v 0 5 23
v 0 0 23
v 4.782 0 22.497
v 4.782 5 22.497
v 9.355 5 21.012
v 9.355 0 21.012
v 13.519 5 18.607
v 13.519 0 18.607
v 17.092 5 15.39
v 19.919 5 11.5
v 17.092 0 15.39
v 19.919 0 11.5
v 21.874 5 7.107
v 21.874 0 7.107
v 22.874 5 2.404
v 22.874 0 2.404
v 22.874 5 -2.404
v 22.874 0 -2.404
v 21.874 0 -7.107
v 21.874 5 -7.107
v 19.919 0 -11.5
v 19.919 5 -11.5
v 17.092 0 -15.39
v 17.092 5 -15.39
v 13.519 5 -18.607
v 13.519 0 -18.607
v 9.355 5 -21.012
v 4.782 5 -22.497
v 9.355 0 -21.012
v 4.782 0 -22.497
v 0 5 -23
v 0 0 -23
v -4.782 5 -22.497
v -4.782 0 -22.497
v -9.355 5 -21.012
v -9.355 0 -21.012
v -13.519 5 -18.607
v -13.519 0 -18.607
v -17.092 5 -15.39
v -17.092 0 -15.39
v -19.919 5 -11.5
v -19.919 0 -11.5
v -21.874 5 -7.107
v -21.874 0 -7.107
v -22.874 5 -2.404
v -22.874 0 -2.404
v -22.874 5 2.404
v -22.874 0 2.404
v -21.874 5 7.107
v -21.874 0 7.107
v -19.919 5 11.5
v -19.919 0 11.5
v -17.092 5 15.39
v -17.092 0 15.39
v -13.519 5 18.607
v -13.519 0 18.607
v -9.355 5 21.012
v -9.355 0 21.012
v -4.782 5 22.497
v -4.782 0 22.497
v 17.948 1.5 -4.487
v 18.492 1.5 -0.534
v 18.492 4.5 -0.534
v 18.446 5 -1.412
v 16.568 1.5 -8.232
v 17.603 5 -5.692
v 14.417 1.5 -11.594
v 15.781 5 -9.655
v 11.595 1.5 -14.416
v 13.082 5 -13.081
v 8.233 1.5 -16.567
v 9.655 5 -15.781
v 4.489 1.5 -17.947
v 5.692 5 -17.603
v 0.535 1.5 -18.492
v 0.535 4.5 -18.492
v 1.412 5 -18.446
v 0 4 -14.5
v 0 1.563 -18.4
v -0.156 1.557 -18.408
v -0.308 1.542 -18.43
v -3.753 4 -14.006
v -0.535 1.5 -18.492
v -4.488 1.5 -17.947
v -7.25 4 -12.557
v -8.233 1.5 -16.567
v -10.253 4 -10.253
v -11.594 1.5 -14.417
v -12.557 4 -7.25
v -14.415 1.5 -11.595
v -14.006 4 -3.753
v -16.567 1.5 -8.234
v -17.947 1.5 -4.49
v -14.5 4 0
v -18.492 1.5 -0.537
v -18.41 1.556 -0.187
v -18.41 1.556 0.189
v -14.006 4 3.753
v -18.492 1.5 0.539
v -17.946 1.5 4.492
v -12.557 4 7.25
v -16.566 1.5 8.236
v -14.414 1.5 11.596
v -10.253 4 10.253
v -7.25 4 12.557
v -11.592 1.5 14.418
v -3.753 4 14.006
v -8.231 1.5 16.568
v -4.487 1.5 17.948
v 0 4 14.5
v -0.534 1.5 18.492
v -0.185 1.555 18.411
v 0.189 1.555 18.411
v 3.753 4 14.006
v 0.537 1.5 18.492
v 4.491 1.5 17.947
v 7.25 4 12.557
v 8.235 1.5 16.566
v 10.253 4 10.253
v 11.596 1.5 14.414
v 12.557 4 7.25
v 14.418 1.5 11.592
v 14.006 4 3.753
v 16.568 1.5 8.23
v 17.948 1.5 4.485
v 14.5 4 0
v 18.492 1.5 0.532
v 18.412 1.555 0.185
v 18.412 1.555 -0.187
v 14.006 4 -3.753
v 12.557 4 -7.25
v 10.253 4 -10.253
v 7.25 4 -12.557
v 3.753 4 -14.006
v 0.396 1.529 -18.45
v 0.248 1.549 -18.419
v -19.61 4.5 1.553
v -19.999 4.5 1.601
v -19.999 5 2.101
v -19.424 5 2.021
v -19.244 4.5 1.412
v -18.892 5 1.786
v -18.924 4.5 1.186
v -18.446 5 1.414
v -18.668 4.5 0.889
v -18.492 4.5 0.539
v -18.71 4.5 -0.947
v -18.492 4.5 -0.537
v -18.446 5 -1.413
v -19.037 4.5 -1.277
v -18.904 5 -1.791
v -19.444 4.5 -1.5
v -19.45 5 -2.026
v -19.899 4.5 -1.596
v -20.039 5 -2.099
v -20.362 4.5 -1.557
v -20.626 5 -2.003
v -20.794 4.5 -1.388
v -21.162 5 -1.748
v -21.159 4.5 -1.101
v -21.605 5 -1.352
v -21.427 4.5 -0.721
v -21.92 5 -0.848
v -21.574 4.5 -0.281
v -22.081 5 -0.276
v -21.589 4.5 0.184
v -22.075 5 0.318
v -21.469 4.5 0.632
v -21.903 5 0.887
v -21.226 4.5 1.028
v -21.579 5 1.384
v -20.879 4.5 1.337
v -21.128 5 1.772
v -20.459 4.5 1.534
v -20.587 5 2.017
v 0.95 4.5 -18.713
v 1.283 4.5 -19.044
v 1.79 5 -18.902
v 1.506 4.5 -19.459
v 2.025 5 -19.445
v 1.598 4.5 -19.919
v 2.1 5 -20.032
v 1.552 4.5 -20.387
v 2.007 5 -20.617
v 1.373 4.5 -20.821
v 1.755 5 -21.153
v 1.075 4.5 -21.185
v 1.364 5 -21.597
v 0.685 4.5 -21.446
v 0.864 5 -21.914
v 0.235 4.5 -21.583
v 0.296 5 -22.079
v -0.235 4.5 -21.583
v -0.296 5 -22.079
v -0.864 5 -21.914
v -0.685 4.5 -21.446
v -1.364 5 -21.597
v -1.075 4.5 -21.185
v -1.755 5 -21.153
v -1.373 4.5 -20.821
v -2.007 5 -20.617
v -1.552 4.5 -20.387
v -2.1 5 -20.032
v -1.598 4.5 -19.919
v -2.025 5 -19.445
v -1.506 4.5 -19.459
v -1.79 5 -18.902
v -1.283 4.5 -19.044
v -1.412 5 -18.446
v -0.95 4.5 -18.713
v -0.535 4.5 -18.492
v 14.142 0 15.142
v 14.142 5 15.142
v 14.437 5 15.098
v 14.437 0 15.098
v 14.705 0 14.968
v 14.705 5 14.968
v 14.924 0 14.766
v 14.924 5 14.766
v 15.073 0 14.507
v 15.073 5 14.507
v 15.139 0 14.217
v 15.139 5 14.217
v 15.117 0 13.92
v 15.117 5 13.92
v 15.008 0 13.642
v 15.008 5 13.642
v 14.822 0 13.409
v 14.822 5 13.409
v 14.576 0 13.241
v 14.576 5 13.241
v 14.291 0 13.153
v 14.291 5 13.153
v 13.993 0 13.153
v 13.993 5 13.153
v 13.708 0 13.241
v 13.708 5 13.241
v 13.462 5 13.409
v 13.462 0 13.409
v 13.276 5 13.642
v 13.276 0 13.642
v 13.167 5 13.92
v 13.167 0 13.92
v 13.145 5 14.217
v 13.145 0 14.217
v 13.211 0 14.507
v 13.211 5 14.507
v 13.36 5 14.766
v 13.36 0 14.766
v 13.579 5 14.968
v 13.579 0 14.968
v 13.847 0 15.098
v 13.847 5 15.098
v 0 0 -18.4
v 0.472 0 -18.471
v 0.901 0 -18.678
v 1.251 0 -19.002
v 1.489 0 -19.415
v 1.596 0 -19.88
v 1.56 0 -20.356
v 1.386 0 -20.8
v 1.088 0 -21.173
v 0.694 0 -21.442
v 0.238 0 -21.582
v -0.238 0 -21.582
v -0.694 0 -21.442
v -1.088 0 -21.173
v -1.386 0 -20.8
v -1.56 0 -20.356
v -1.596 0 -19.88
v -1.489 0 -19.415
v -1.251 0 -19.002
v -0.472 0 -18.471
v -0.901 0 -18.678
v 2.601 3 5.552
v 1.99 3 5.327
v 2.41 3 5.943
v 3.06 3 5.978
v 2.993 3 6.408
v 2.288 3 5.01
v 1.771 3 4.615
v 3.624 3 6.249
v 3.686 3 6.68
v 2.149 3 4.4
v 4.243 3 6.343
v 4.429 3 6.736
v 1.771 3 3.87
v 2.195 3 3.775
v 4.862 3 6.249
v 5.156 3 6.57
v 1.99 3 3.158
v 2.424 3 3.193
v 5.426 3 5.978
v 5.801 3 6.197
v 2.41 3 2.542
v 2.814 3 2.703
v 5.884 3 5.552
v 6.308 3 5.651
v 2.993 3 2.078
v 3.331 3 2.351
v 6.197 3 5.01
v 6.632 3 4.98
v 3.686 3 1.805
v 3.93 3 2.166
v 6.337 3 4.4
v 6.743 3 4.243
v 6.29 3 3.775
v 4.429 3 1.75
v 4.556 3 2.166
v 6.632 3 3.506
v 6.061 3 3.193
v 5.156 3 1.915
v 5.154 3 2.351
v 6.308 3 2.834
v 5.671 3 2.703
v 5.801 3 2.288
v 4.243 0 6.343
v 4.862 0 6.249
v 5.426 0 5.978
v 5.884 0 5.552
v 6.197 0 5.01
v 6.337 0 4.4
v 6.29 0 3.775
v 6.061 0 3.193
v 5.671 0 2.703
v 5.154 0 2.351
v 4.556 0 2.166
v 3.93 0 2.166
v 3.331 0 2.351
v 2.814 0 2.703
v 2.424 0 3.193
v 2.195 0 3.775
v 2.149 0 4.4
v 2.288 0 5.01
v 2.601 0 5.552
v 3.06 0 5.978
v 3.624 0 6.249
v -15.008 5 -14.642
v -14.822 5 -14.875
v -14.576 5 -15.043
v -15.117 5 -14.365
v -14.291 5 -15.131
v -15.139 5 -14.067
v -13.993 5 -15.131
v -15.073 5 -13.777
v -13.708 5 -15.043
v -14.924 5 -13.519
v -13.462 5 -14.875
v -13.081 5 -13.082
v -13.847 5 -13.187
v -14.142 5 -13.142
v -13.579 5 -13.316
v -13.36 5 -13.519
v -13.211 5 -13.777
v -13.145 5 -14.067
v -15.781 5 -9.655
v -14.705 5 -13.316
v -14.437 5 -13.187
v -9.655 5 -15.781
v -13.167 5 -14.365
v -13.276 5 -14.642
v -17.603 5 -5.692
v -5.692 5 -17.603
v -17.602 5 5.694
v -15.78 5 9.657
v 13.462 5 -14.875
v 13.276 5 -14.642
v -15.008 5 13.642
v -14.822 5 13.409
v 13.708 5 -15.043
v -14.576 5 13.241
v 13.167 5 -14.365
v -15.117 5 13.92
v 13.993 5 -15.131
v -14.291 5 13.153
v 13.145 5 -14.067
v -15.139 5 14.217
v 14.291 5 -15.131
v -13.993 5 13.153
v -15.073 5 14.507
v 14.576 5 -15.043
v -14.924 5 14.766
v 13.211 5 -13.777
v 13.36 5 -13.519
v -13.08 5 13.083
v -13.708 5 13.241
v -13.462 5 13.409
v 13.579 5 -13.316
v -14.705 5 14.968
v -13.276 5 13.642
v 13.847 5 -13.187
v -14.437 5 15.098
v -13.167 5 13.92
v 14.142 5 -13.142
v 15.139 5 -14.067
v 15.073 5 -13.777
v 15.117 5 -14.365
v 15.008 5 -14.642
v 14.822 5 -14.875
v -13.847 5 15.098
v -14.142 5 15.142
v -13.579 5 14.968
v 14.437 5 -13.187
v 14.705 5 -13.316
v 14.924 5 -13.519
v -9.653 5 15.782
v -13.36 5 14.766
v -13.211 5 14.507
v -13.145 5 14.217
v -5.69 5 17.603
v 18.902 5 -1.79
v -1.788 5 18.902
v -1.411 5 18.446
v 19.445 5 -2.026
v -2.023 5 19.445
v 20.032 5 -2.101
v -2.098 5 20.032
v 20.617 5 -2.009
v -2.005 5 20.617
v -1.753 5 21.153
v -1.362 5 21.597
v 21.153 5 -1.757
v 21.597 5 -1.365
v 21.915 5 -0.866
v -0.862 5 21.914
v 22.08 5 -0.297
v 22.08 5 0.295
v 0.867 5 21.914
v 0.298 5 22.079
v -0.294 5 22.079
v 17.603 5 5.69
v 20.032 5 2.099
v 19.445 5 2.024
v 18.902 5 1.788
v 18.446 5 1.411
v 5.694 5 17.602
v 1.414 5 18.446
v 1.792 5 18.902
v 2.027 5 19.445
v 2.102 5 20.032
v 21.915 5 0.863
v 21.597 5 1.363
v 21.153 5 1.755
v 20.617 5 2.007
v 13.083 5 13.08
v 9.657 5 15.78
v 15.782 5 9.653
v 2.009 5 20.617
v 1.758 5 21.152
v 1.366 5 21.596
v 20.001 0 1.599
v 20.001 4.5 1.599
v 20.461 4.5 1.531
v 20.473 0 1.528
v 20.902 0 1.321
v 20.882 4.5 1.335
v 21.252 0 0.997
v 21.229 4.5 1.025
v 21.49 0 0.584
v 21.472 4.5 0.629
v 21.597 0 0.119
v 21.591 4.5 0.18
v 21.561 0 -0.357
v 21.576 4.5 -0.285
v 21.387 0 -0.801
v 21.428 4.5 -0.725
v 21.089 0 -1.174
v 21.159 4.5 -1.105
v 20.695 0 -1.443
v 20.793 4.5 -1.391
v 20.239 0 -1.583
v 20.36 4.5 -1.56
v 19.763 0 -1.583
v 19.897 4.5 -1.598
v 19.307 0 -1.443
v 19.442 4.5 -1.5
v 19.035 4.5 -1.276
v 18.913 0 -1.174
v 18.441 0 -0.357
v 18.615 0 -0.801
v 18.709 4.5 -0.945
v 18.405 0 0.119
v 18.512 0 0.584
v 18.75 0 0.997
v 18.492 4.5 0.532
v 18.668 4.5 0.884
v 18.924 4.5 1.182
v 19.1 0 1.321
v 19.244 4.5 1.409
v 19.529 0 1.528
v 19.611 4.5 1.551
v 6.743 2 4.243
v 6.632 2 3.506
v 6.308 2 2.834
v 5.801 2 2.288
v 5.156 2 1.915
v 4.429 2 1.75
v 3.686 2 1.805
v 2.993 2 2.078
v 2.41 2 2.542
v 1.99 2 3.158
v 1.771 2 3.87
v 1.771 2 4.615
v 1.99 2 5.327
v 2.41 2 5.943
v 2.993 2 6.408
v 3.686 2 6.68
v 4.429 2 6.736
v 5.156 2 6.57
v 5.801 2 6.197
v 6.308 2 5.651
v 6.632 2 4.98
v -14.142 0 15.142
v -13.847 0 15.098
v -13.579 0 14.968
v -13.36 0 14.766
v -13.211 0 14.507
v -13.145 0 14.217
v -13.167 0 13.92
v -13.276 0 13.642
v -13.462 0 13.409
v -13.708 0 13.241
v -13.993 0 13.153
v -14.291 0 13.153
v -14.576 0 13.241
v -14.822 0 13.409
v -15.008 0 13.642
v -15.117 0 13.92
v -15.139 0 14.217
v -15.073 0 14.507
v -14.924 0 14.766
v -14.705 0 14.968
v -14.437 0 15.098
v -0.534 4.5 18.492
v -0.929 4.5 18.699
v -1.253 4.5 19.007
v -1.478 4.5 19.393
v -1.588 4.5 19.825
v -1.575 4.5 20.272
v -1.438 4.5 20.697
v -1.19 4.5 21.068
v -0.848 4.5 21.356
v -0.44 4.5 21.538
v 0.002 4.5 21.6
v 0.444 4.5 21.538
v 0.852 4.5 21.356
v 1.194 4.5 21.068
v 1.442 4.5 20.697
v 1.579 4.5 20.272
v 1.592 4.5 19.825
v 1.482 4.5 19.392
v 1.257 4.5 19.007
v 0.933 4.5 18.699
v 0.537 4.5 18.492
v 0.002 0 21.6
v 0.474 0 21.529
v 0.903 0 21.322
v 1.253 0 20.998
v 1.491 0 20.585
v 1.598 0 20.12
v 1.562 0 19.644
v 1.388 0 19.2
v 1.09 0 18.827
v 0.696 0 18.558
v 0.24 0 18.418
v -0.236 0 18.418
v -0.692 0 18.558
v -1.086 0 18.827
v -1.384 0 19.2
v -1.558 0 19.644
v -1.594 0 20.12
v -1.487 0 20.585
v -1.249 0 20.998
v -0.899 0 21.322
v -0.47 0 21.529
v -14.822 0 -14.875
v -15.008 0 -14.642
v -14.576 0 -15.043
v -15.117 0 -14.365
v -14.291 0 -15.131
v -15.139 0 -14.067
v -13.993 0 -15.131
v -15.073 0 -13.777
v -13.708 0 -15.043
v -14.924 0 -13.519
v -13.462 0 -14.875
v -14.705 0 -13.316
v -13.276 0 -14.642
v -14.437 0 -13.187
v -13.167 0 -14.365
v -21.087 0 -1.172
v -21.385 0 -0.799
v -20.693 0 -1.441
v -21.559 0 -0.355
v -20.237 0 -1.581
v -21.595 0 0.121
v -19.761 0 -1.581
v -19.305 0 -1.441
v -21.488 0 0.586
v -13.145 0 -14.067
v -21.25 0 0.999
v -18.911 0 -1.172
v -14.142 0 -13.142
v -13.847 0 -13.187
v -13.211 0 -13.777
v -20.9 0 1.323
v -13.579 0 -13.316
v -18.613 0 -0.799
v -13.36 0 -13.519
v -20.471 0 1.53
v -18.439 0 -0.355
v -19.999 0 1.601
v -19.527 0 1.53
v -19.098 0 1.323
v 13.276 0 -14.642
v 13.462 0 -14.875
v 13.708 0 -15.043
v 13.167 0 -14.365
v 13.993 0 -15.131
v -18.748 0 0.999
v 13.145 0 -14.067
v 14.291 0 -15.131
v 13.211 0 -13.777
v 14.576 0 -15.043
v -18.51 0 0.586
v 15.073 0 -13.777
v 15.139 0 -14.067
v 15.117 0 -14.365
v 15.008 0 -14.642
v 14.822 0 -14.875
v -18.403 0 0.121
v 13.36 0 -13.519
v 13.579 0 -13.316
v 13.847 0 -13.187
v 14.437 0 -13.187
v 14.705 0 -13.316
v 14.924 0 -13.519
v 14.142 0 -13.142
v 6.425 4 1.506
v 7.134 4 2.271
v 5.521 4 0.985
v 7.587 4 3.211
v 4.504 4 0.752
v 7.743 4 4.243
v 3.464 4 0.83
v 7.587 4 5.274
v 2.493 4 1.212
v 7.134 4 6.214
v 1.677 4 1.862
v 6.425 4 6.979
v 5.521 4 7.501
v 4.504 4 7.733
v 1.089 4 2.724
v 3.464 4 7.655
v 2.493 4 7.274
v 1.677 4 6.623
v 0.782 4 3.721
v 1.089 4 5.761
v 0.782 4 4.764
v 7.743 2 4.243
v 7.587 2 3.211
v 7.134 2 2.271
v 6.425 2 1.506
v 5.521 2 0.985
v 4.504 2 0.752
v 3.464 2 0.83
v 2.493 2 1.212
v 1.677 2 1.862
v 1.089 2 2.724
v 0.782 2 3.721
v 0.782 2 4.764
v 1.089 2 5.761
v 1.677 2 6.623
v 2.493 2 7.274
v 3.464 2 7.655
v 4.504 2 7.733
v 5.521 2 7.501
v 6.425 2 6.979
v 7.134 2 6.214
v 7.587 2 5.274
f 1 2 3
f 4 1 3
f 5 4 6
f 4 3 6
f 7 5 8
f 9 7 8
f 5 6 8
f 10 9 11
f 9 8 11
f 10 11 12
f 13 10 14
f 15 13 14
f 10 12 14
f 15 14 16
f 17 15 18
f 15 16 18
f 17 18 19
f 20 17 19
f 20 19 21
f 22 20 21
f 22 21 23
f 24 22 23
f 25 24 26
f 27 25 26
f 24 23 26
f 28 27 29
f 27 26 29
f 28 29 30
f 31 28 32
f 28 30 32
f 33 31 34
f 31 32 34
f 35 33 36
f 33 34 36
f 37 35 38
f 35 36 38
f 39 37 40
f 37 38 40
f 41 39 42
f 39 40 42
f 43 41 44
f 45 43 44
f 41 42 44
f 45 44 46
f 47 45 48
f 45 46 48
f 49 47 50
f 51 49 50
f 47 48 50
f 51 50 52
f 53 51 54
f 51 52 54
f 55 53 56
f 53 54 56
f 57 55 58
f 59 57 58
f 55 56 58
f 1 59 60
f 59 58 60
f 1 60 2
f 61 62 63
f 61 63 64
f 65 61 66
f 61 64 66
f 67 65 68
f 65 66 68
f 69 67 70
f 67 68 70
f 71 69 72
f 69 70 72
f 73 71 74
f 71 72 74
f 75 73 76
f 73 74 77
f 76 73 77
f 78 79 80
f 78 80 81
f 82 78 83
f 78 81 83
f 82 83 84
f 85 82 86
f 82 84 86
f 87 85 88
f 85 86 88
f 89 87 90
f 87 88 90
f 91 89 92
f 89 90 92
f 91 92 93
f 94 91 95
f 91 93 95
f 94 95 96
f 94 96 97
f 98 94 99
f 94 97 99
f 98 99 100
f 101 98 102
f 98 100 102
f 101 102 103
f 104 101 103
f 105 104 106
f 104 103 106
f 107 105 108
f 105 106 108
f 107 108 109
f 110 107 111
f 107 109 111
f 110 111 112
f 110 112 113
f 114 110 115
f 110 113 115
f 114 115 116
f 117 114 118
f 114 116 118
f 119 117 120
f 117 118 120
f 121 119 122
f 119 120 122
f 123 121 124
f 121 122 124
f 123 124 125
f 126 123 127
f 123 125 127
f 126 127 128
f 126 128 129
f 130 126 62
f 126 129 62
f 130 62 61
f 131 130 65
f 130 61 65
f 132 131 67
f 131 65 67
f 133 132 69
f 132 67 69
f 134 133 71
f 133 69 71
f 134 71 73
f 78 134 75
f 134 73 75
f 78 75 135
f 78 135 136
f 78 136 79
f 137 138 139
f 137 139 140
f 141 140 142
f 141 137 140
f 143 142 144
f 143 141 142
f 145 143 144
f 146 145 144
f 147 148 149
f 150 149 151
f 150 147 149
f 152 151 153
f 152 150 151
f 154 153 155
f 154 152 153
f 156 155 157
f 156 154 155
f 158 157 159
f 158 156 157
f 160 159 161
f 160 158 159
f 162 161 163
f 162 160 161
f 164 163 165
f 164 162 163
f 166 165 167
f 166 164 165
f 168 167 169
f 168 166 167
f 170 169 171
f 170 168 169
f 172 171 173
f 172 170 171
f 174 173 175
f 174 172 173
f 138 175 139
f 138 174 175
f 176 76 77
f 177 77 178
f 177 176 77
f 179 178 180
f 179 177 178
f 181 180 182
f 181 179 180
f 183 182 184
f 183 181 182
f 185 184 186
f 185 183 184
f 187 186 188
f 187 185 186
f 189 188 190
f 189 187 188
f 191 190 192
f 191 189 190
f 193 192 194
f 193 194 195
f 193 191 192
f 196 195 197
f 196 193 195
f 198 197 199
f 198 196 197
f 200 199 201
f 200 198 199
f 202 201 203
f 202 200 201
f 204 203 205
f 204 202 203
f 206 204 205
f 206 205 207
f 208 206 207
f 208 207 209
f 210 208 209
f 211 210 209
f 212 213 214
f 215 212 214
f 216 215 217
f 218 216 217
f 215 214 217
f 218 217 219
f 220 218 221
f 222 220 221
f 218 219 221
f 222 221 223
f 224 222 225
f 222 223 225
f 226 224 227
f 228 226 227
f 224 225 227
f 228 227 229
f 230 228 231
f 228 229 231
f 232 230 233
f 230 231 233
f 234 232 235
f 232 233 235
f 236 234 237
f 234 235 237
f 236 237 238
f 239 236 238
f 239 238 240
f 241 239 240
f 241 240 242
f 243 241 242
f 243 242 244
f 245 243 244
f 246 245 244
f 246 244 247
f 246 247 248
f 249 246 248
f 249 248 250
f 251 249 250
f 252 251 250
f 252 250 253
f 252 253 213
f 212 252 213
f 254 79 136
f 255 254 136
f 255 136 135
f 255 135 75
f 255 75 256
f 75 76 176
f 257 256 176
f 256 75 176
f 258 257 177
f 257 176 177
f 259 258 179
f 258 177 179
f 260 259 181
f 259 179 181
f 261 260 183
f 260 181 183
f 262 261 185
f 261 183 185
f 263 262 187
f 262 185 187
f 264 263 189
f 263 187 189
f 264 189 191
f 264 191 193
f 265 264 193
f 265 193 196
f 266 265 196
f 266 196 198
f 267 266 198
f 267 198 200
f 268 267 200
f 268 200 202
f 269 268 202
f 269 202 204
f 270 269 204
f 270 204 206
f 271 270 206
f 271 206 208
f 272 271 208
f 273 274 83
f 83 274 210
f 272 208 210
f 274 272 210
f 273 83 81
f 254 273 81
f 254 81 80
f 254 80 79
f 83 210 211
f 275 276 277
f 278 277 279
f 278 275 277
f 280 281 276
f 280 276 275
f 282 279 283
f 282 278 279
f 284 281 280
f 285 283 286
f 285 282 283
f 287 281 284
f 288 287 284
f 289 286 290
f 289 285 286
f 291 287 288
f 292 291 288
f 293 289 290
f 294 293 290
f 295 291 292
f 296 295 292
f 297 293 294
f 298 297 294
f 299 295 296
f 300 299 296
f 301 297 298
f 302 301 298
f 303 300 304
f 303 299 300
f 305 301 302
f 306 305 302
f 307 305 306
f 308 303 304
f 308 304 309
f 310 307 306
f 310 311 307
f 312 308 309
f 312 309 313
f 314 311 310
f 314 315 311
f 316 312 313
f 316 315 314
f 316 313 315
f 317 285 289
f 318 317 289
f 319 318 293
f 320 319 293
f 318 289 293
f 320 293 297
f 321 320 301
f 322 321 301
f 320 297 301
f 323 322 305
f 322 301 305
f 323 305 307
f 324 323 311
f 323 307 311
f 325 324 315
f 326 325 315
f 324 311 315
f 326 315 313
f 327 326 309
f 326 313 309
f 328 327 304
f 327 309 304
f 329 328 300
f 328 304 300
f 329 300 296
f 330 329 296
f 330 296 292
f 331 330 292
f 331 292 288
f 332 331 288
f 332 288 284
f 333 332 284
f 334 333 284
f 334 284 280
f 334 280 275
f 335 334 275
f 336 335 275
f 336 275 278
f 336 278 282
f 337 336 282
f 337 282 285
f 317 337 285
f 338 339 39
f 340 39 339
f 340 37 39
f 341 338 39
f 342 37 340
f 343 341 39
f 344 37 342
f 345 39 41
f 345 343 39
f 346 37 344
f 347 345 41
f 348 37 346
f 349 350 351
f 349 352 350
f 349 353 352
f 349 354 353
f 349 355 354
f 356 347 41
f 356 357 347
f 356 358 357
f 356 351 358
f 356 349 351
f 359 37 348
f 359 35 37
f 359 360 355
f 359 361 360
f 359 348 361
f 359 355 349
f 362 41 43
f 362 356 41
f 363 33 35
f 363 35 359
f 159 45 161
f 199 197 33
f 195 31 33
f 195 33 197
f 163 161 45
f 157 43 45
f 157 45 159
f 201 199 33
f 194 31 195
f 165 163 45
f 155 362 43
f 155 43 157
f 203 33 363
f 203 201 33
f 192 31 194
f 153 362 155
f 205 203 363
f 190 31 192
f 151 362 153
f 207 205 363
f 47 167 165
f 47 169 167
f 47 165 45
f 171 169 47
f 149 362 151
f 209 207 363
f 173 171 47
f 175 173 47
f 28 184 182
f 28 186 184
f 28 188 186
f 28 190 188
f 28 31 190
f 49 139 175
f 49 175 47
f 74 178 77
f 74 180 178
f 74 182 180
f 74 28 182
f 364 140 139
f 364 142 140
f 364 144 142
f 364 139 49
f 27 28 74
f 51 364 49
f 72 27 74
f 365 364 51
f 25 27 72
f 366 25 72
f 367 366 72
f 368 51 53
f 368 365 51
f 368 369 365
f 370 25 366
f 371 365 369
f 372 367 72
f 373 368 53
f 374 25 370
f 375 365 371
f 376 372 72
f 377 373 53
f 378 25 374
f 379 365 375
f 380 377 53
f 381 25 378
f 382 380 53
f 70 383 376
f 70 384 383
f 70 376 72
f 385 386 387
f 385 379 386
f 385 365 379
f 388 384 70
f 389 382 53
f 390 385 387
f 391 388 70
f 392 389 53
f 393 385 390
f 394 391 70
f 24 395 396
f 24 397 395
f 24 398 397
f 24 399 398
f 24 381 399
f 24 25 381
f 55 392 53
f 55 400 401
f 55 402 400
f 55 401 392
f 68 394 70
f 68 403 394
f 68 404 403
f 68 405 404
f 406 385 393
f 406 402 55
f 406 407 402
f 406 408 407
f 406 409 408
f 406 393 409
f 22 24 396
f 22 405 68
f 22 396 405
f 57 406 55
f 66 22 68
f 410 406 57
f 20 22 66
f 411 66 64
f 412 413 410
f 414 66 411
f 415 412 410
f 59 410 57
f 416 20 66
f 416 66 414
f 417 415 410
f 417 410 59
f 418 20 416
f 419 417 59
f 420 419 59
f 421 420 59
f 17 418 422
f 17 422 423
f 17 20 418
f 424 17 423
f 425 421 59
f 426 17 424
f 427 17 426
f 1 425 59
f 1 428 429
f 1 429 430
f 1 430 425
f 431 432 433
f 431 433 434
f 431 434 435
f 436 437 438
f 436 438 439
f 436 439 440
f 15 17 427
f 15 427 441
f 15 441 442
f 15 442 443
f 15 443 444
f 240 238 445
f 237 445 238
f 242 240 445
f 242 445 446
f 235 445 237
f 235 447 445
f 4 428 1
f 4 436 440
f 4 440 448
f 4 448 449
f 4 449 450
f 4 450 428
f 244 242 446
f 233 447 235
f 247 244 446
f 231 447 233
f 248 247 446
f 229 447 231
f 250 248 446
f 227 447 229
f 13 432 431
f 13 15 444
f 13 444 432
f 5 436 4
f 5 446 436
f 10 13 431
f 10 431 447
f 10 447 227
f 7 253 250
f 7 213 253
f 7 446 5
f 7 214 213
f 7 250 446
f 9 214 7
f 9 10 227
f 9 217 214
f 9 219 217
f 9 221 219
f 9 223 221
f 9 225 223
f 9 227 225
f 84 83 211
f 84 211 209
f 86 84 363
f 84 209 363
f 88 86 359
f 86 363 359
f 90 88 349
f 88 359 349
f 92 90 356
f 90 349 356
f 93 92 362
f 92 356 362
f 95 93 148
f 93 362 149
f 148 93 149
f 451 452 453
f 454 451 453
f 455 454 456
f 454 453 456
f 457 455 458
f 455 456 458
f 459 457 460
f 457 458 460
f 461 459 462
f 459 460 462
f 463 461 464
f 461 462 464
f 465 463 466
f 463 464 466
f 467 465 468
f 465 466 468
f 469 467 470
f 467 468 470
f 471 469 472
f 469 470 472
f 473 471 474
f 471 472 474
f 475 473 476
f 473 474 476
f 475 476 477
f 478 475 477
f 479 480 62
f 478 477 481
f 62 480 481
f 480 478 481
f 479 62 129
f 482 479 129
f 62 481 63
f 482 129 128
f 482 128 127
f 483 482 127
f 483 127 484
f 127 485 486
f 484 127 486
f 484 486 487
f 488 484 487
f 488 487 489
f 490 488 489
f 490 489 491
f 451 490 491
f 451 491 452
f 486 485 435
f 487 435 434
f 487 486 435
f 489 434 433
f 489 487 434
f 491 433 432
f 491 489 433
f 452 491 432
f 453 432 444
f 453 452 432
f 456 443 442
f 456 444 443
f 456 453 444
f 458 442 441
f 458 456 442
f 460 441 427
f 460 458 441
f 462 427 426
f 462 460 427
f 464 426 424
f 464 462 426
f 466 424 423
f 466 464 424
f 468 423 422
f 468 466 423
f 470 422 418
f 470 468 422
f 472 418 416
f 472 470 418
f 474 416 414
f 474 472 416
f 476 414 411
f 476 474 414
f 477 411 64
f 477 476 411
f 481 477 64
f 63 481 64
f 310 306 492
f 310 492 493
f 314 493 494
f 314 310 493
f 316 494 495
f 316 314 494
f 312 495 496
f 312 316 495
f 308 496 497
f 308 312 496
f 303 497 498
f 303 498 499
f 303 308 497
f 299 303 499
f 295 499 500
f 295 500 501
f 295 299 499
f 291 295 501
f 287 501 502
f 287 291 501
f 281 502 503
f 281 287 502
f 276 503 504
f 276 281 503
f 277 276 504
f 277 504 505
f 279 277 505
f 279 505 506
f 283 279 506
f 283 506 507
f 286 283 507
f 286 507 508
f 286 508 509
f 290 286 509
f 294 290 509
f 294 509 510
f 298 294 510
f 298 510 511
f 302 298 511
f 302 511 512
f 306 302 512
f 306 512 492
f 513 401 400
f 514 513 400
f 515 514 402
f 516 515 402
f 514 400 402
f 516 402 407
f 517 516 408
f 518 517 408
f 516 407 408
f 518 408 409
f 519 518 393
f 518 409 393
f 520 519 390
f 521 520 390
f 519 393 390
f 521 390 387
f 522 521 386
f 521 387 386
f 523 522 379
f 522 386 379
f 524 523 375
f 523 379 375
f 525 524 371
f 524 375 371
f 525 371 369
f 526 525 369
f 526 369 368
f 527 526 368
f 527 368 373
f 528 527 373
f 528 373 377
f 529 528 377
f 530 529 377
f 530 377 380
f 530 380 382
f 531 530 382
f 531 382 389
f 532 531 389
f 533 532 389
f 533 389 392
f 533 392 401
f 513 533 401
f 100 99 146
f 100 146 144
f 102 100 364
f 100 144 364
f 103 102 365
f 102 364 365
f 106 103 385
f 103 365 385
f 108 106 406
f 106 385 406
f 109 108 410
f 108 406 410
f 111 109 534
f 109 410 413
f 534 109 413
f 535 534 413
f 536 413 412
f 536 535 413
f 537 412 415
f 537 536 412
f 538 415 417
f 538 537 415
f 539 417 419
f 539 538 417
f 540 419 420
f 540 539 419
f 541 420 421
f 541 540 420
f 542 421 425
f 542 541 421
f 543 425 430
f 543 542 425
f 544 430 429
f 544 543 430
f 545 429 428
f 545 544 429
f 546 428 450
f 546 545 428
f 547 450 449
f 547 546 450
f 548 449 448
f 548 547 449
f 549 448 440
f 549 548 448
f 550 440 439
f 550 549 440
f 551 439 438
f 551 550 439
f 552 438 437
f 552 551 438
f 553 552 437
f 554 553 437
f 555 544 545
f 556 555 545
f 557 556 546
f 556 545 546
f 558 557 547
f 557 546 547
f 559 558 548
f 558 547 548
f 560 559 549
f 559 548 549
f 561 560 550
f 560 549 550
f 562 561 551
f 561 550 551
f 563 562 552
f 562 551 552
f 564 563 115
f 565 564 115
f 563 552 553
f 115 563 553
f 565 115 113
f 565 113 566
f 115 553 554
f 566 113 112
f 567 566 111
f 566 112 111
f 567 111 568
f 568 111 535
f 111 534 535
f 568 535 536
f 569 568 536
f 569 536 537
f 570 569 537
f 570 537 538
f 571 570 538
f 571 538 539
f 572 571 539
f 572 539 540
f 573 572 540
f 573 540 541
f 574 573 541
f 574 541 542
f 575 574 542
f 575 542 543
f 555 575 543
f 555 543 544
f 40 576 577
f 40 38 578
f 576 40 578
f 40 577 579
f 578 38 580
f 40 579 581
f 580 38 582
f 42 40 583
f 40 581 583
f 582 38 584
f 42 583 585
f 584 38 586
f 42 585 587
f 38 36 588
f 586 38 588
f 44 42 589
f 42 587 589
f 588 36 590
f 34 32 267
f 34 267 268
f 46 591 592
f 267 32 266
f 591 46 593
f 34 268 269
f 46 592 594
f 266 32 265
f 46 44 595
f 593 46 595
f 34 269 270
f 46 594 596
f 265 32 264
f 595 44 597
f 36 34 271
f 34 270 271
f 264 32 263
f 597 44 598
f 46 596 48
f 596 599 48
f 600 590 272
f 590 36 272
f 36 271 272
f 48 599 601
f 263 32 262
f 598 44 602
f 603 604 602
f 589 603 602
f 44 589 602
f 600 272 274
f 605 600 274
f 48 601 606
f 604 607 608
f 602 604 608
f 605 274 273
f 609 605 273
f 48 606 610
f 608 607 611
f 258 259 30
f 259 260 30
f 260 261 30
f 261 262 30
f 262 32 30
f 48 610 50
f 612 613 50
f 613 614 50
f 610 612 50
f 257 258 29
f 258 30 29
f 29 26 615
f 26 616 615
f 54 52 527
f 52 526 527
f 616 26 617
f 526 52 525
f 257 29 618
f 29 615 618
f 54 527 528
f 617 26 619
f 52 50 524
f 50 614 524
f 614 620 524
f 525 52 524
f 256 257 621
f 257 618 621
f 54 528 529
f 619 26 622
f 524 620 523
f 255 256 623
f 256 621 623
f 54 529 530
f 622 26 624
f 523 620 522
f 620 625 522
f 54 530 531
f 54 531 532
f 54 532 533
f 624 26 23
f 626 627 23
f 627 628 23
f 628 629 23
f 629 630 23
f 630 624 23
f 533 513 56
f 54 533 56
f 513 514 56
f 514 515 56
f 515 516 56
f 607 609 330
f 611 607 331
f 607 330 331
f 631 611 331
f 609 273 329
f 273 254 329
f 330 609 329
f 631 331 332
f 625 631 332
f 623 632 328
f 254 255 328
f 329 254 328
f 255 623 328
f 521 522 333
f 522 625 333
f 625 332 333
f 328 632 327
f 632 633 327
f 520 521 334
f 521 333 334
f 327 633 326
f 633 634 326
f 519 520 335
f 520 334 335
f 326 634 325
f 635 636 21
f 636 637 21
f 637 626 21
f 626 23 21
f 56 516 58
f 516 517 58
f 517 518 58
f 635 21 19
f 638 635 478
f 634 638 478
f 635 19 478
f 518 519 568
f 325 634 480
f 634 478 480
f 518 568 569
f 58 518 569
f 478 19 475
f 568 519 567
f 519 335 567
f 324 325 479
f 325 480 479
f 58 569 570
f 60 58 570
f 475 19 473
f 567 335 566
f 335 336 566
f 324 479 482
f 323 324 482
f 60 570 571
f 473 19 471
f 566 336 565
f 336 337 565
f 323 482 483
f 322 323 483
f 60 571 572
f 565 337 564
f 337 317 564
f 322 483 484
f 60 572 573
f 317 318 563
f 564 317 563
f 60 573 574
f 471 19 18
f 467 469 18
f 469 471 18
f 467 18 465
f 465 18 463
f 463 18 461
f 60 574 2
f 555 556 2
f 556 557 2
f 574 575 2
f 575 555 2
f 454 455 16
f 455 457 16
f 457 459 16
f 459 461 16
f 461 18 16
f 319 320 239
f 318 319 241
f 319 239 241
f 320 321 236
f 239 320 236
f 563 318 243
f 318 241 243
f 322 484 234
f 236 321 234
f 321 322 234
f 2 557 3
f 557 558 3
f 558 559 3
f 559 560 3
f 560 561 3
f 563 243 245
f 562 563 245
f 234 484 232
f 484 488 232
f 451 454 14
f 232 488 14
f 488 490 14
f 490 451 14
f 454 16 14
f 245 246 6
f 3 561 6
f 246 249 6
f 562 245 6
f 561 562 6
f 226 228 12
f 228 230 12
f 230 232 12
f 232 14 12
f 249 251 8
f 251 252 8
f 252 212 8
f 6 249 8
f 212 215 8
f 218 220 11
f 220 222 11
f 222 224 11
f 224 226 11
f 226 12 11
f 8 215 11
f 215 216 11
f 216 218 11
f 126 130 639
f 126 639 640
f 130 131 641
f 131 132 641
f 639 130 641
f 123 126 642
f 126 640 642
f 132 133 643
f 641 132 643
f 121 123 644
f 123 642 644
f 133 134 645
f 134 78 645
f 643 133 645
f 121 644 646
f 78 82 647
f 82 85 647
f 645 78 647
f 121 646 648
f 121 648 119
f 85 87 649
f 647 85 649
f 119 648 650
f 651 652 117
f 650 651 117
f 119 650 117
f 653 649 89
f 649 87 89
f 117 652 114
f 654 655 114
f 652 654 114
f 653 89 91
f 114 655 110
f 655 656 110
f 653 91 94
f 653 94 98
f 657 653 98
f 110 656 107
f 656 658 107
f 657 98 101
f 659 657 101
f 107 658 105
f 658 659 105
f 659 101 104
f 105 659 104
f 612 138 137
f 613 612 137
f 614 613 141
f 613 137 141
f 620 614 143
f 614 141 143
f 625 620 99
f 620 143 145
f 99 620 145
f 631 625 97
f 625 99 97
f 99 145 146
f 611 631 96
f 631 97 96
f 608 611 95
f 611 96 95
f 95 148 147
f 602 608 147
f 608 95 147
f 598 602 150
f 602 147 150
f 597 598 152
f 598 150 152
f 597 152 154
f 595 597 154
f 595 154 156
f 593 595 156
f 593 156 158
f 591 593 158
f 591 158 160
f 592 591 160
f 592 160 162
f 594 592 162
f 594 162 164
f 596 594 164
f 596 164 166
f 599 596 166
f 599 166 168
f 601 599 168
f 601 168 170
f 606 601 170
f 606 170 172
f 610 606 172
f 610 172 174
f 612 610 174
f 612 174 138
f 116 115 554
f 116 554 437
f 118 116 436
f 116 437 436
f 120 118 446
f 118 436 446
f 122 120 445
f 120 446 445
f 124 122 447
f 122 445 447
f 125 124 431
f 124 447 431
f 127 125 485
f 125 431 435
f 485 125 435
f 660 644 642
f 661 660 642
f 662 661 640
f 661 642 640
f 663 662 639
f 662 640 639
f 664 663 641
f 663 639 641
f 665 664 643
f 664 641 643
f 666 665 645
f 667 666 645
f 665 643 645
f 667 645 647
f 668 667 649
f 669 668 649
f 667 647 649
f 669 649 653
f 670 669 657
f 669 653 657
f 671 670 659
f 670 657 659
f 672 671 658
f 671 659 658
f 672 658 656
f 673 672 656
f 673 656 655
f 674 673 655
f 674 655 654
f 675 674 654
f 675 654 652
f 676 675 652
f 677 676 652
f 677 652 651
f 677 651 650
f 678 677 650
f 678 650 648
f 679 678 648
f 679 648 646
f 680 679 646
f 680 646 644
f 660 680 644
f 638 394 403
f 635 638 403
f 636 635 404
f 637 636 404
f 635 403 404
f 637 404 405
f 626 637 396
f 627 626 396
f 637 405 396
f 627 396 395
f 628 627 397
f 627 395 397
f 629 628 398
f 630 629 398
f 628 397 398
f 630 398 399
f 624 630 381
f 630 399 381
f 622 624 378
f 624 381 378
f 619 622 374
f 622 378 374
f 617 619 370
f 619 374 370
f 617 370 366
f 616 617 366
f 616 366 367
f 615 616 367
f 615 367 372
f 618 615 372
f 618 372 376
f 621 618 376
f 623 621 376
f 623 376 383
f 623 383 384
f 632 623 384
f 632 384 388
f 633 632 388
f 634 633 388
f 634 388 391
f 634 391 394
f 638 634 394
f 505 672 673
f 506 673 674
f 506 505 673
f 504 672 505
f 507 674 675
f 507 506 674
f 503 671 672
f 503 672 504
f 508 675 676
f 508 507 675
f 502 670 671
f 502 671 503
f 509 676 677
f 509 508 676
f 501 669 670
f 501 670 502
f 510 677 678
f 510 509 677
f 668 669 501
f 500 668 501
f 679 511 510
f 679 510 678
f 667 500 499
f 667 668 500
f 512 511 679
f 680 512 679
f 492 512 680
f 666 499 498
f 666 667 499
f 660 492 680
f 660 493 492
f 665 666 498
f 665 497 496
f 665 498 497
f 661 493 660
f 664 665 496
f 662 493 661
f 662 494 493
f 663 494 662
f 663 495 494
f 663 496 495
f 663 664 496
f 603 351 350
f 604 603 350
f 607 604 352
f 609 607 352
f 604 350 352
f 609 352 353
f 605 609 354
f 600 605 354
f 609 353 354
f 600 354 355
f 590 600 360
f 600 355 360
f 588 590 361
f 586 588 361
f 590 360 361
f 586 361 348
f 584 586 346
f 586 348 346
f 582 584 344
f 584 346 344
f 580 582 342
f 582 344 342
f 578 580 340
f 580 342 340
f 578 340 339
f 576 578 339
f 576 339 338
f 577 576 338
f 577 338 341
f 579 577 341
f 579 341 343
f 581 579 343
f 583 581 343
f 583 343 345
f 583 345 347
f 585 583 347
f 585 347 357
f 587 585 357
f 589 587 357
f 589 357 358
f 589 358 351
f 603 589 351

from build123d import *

# Parameters (mm, degrees)
SKETCH_1_R            = 23
EXTRUDE_1_DEPTH       = 5
SKETCH_2_R            = 1.6
CUT_EXTRUDE_1_DEPTH   = 33.908965344
SKETCH_3_R            = 1
CUT_EXTRUDE_2_DEPTH   = 33.908965344
SKETCH_4_W            = 14.5
SKETCH_4_H            = 1
SKETCH_5_R            = 2.1
CUT_EXTRUDE_3_DEPTH   = 33.771939229
SKETCH_6_R            = 3.5
SKETCH_6_R_2          = 2.5
CUT_EXTRUDE_1_2_DEPTH = 2
SKETCH_7_R            = 3.5
CUT_EXTRUDE_4_DEPTH   = 1
CHAMFER_1_SIZE        = 0.5


with BuildPart() as part:
    # 草图1 → 凸台-拉伸1 (new body)
    with BuildSketch(Plane(origin=(0, 0, 0), x_dir=(1, 0, 0), z_dir=(0, 1, 0))):
        with Locations(Location((0, 0, 0), (0, 0, 270))):
            Circle(SKETCH_1_R)
    extrude(amount=EXTRUDE_1_DEPTH)

    # 草图2 → Cut-Extrude 1 (cut, through all)
    with BuildSketch(Plane(origin=(0, 5, 0), x_dir=(1, 0, 0), z_dir=(0, 1, 0))):
        with Locations(Location((0, 20, 0), (0, 0, 270))):
            Circle(SKETCH_2_R)
        with Locations(Location((20.001, 0.001, 0), (0, 0, 270))):
            Circle(SKETCH_2_R)
        with Locations(Location((0.002, -20, 0), (0, 0, 270))):
            Circle(SKETCH_2_R)
        with Locations(Location((-19.999, -0.001, 0), (0, 0, 270))):
            Circle(SKETCH_2_R)
    extrude(amount=-CUT_EXTRUDE_1_DEPTH, mode=Mode.SUBTRACT)

    # 草图3 → 切除-拉伸2 (cut, through all)
    with BuildSketch(Plane(origin=(0, 5, 0), x_dir=(1, 0, 0), z_dir=(0, 1, 0))):
        with Locations(Location((14.142135624, 14.142135624, 0), (0, 0, 270))):
            Circle(SKETCH_3_R)
        with Locations(Location((14.142135624, -14.142135624, 0), (0, 0, 270))):
            Circle(SKETCH_3_R)
        with Locations(Location((-14.142135624, -14.142135624, 0), (0, 0, 270))):
            Circle(SKETCH_3_R)
        with Locations(Location((-14.142135624, 14.142135624, 0), (0, 0, 270))):
            Circle(SKETCH_3_R)
    extrude(amount=-CUT_EXTRUDE_2_DEPTH, mode=Mode.SUBTRACT)

    # 草图4 → 切除-旋转1 (revolve, cut)
    with BuildSketch(Plane.XY, mode=Mode.PRIVATE) as cut_revolve_1_sk:
        with Locations((7.25, 4.5)):
            Rectangle(SKETCH_4_W, SKETCH_4_H)
        Polygon((18.5, 1.5), (18.5, 5), (14.5, 5), (14.5, 4), align=None)
    revolve(cut_revolve_1_sk.sketch.rotate(Axis((0, 0, 0), (0, 1, 0)), 90), axis=Axis((0, 0, 0), (0, 1, 0)), mode=Mode.SUBTRACT)

    # 草图5 → 切除-拉伸3 (cut, through all)
    with BuildSketch(Plane(origin=(0, 4, 0), x_dir=(1, 0, 0), z_dir=(0, 1, 0))):
        with Locations(Location((4.242640687, -4.242640687, 0), (0, 0, 270))):
            Circle(SKETCH_5_R)
    extrude(amount=-CUT_EXTRUDE_3_DEPTH, mode=Mode.SUBTRACT)

    # 草图6 → Cut-Extrude 1 2 (cut)
    with BuildSketch(Plane(origin=(0, 4, 0), x_dir=(1, 0, 0), z_dir=(0, 1, 0))):
        with Locations((4.242640687, -4.242640687)):
            Circle(SKETCH_6_R)
        with Locations((4.242640687, -4.242640687)):
            Circle(SKETCH_6_R_2, mode=Mode.SUBTRACT)
    extrude(amount=-CUT_EXTRUDE_1_2_DEPTH, mode=Mode.SUBTRACT)

    # 草图7 → 切除-拉伸4 (cut)
    with BuildSketch(Plane(origin=(0, 4, 0), x_dir=(1, 0, 0), z_dir=(0, 1, 0))):
        with Locations((4.242640687, -4.242640687)):
            Circle(SKETCH_7_R)
    extrude(amount=-CUT_EXTRUDE_4_DEPTH, mode=Mode.SUBTRACT)

    # 倒角1
    chamfer_1_edges = [part.edges().sort_by_distance(p)[0] for p in [
        (0, 5, -21.6),
        (21.307215325, 5, -0.925013812),
        (1.578782453, 5, 20.271582579),
        (-21.306855112, 5, -0.920691384),
    ]]
    chamfer(chamfer_1_edges, length=CHAMFER_1_SIZE)


solid = part.part
